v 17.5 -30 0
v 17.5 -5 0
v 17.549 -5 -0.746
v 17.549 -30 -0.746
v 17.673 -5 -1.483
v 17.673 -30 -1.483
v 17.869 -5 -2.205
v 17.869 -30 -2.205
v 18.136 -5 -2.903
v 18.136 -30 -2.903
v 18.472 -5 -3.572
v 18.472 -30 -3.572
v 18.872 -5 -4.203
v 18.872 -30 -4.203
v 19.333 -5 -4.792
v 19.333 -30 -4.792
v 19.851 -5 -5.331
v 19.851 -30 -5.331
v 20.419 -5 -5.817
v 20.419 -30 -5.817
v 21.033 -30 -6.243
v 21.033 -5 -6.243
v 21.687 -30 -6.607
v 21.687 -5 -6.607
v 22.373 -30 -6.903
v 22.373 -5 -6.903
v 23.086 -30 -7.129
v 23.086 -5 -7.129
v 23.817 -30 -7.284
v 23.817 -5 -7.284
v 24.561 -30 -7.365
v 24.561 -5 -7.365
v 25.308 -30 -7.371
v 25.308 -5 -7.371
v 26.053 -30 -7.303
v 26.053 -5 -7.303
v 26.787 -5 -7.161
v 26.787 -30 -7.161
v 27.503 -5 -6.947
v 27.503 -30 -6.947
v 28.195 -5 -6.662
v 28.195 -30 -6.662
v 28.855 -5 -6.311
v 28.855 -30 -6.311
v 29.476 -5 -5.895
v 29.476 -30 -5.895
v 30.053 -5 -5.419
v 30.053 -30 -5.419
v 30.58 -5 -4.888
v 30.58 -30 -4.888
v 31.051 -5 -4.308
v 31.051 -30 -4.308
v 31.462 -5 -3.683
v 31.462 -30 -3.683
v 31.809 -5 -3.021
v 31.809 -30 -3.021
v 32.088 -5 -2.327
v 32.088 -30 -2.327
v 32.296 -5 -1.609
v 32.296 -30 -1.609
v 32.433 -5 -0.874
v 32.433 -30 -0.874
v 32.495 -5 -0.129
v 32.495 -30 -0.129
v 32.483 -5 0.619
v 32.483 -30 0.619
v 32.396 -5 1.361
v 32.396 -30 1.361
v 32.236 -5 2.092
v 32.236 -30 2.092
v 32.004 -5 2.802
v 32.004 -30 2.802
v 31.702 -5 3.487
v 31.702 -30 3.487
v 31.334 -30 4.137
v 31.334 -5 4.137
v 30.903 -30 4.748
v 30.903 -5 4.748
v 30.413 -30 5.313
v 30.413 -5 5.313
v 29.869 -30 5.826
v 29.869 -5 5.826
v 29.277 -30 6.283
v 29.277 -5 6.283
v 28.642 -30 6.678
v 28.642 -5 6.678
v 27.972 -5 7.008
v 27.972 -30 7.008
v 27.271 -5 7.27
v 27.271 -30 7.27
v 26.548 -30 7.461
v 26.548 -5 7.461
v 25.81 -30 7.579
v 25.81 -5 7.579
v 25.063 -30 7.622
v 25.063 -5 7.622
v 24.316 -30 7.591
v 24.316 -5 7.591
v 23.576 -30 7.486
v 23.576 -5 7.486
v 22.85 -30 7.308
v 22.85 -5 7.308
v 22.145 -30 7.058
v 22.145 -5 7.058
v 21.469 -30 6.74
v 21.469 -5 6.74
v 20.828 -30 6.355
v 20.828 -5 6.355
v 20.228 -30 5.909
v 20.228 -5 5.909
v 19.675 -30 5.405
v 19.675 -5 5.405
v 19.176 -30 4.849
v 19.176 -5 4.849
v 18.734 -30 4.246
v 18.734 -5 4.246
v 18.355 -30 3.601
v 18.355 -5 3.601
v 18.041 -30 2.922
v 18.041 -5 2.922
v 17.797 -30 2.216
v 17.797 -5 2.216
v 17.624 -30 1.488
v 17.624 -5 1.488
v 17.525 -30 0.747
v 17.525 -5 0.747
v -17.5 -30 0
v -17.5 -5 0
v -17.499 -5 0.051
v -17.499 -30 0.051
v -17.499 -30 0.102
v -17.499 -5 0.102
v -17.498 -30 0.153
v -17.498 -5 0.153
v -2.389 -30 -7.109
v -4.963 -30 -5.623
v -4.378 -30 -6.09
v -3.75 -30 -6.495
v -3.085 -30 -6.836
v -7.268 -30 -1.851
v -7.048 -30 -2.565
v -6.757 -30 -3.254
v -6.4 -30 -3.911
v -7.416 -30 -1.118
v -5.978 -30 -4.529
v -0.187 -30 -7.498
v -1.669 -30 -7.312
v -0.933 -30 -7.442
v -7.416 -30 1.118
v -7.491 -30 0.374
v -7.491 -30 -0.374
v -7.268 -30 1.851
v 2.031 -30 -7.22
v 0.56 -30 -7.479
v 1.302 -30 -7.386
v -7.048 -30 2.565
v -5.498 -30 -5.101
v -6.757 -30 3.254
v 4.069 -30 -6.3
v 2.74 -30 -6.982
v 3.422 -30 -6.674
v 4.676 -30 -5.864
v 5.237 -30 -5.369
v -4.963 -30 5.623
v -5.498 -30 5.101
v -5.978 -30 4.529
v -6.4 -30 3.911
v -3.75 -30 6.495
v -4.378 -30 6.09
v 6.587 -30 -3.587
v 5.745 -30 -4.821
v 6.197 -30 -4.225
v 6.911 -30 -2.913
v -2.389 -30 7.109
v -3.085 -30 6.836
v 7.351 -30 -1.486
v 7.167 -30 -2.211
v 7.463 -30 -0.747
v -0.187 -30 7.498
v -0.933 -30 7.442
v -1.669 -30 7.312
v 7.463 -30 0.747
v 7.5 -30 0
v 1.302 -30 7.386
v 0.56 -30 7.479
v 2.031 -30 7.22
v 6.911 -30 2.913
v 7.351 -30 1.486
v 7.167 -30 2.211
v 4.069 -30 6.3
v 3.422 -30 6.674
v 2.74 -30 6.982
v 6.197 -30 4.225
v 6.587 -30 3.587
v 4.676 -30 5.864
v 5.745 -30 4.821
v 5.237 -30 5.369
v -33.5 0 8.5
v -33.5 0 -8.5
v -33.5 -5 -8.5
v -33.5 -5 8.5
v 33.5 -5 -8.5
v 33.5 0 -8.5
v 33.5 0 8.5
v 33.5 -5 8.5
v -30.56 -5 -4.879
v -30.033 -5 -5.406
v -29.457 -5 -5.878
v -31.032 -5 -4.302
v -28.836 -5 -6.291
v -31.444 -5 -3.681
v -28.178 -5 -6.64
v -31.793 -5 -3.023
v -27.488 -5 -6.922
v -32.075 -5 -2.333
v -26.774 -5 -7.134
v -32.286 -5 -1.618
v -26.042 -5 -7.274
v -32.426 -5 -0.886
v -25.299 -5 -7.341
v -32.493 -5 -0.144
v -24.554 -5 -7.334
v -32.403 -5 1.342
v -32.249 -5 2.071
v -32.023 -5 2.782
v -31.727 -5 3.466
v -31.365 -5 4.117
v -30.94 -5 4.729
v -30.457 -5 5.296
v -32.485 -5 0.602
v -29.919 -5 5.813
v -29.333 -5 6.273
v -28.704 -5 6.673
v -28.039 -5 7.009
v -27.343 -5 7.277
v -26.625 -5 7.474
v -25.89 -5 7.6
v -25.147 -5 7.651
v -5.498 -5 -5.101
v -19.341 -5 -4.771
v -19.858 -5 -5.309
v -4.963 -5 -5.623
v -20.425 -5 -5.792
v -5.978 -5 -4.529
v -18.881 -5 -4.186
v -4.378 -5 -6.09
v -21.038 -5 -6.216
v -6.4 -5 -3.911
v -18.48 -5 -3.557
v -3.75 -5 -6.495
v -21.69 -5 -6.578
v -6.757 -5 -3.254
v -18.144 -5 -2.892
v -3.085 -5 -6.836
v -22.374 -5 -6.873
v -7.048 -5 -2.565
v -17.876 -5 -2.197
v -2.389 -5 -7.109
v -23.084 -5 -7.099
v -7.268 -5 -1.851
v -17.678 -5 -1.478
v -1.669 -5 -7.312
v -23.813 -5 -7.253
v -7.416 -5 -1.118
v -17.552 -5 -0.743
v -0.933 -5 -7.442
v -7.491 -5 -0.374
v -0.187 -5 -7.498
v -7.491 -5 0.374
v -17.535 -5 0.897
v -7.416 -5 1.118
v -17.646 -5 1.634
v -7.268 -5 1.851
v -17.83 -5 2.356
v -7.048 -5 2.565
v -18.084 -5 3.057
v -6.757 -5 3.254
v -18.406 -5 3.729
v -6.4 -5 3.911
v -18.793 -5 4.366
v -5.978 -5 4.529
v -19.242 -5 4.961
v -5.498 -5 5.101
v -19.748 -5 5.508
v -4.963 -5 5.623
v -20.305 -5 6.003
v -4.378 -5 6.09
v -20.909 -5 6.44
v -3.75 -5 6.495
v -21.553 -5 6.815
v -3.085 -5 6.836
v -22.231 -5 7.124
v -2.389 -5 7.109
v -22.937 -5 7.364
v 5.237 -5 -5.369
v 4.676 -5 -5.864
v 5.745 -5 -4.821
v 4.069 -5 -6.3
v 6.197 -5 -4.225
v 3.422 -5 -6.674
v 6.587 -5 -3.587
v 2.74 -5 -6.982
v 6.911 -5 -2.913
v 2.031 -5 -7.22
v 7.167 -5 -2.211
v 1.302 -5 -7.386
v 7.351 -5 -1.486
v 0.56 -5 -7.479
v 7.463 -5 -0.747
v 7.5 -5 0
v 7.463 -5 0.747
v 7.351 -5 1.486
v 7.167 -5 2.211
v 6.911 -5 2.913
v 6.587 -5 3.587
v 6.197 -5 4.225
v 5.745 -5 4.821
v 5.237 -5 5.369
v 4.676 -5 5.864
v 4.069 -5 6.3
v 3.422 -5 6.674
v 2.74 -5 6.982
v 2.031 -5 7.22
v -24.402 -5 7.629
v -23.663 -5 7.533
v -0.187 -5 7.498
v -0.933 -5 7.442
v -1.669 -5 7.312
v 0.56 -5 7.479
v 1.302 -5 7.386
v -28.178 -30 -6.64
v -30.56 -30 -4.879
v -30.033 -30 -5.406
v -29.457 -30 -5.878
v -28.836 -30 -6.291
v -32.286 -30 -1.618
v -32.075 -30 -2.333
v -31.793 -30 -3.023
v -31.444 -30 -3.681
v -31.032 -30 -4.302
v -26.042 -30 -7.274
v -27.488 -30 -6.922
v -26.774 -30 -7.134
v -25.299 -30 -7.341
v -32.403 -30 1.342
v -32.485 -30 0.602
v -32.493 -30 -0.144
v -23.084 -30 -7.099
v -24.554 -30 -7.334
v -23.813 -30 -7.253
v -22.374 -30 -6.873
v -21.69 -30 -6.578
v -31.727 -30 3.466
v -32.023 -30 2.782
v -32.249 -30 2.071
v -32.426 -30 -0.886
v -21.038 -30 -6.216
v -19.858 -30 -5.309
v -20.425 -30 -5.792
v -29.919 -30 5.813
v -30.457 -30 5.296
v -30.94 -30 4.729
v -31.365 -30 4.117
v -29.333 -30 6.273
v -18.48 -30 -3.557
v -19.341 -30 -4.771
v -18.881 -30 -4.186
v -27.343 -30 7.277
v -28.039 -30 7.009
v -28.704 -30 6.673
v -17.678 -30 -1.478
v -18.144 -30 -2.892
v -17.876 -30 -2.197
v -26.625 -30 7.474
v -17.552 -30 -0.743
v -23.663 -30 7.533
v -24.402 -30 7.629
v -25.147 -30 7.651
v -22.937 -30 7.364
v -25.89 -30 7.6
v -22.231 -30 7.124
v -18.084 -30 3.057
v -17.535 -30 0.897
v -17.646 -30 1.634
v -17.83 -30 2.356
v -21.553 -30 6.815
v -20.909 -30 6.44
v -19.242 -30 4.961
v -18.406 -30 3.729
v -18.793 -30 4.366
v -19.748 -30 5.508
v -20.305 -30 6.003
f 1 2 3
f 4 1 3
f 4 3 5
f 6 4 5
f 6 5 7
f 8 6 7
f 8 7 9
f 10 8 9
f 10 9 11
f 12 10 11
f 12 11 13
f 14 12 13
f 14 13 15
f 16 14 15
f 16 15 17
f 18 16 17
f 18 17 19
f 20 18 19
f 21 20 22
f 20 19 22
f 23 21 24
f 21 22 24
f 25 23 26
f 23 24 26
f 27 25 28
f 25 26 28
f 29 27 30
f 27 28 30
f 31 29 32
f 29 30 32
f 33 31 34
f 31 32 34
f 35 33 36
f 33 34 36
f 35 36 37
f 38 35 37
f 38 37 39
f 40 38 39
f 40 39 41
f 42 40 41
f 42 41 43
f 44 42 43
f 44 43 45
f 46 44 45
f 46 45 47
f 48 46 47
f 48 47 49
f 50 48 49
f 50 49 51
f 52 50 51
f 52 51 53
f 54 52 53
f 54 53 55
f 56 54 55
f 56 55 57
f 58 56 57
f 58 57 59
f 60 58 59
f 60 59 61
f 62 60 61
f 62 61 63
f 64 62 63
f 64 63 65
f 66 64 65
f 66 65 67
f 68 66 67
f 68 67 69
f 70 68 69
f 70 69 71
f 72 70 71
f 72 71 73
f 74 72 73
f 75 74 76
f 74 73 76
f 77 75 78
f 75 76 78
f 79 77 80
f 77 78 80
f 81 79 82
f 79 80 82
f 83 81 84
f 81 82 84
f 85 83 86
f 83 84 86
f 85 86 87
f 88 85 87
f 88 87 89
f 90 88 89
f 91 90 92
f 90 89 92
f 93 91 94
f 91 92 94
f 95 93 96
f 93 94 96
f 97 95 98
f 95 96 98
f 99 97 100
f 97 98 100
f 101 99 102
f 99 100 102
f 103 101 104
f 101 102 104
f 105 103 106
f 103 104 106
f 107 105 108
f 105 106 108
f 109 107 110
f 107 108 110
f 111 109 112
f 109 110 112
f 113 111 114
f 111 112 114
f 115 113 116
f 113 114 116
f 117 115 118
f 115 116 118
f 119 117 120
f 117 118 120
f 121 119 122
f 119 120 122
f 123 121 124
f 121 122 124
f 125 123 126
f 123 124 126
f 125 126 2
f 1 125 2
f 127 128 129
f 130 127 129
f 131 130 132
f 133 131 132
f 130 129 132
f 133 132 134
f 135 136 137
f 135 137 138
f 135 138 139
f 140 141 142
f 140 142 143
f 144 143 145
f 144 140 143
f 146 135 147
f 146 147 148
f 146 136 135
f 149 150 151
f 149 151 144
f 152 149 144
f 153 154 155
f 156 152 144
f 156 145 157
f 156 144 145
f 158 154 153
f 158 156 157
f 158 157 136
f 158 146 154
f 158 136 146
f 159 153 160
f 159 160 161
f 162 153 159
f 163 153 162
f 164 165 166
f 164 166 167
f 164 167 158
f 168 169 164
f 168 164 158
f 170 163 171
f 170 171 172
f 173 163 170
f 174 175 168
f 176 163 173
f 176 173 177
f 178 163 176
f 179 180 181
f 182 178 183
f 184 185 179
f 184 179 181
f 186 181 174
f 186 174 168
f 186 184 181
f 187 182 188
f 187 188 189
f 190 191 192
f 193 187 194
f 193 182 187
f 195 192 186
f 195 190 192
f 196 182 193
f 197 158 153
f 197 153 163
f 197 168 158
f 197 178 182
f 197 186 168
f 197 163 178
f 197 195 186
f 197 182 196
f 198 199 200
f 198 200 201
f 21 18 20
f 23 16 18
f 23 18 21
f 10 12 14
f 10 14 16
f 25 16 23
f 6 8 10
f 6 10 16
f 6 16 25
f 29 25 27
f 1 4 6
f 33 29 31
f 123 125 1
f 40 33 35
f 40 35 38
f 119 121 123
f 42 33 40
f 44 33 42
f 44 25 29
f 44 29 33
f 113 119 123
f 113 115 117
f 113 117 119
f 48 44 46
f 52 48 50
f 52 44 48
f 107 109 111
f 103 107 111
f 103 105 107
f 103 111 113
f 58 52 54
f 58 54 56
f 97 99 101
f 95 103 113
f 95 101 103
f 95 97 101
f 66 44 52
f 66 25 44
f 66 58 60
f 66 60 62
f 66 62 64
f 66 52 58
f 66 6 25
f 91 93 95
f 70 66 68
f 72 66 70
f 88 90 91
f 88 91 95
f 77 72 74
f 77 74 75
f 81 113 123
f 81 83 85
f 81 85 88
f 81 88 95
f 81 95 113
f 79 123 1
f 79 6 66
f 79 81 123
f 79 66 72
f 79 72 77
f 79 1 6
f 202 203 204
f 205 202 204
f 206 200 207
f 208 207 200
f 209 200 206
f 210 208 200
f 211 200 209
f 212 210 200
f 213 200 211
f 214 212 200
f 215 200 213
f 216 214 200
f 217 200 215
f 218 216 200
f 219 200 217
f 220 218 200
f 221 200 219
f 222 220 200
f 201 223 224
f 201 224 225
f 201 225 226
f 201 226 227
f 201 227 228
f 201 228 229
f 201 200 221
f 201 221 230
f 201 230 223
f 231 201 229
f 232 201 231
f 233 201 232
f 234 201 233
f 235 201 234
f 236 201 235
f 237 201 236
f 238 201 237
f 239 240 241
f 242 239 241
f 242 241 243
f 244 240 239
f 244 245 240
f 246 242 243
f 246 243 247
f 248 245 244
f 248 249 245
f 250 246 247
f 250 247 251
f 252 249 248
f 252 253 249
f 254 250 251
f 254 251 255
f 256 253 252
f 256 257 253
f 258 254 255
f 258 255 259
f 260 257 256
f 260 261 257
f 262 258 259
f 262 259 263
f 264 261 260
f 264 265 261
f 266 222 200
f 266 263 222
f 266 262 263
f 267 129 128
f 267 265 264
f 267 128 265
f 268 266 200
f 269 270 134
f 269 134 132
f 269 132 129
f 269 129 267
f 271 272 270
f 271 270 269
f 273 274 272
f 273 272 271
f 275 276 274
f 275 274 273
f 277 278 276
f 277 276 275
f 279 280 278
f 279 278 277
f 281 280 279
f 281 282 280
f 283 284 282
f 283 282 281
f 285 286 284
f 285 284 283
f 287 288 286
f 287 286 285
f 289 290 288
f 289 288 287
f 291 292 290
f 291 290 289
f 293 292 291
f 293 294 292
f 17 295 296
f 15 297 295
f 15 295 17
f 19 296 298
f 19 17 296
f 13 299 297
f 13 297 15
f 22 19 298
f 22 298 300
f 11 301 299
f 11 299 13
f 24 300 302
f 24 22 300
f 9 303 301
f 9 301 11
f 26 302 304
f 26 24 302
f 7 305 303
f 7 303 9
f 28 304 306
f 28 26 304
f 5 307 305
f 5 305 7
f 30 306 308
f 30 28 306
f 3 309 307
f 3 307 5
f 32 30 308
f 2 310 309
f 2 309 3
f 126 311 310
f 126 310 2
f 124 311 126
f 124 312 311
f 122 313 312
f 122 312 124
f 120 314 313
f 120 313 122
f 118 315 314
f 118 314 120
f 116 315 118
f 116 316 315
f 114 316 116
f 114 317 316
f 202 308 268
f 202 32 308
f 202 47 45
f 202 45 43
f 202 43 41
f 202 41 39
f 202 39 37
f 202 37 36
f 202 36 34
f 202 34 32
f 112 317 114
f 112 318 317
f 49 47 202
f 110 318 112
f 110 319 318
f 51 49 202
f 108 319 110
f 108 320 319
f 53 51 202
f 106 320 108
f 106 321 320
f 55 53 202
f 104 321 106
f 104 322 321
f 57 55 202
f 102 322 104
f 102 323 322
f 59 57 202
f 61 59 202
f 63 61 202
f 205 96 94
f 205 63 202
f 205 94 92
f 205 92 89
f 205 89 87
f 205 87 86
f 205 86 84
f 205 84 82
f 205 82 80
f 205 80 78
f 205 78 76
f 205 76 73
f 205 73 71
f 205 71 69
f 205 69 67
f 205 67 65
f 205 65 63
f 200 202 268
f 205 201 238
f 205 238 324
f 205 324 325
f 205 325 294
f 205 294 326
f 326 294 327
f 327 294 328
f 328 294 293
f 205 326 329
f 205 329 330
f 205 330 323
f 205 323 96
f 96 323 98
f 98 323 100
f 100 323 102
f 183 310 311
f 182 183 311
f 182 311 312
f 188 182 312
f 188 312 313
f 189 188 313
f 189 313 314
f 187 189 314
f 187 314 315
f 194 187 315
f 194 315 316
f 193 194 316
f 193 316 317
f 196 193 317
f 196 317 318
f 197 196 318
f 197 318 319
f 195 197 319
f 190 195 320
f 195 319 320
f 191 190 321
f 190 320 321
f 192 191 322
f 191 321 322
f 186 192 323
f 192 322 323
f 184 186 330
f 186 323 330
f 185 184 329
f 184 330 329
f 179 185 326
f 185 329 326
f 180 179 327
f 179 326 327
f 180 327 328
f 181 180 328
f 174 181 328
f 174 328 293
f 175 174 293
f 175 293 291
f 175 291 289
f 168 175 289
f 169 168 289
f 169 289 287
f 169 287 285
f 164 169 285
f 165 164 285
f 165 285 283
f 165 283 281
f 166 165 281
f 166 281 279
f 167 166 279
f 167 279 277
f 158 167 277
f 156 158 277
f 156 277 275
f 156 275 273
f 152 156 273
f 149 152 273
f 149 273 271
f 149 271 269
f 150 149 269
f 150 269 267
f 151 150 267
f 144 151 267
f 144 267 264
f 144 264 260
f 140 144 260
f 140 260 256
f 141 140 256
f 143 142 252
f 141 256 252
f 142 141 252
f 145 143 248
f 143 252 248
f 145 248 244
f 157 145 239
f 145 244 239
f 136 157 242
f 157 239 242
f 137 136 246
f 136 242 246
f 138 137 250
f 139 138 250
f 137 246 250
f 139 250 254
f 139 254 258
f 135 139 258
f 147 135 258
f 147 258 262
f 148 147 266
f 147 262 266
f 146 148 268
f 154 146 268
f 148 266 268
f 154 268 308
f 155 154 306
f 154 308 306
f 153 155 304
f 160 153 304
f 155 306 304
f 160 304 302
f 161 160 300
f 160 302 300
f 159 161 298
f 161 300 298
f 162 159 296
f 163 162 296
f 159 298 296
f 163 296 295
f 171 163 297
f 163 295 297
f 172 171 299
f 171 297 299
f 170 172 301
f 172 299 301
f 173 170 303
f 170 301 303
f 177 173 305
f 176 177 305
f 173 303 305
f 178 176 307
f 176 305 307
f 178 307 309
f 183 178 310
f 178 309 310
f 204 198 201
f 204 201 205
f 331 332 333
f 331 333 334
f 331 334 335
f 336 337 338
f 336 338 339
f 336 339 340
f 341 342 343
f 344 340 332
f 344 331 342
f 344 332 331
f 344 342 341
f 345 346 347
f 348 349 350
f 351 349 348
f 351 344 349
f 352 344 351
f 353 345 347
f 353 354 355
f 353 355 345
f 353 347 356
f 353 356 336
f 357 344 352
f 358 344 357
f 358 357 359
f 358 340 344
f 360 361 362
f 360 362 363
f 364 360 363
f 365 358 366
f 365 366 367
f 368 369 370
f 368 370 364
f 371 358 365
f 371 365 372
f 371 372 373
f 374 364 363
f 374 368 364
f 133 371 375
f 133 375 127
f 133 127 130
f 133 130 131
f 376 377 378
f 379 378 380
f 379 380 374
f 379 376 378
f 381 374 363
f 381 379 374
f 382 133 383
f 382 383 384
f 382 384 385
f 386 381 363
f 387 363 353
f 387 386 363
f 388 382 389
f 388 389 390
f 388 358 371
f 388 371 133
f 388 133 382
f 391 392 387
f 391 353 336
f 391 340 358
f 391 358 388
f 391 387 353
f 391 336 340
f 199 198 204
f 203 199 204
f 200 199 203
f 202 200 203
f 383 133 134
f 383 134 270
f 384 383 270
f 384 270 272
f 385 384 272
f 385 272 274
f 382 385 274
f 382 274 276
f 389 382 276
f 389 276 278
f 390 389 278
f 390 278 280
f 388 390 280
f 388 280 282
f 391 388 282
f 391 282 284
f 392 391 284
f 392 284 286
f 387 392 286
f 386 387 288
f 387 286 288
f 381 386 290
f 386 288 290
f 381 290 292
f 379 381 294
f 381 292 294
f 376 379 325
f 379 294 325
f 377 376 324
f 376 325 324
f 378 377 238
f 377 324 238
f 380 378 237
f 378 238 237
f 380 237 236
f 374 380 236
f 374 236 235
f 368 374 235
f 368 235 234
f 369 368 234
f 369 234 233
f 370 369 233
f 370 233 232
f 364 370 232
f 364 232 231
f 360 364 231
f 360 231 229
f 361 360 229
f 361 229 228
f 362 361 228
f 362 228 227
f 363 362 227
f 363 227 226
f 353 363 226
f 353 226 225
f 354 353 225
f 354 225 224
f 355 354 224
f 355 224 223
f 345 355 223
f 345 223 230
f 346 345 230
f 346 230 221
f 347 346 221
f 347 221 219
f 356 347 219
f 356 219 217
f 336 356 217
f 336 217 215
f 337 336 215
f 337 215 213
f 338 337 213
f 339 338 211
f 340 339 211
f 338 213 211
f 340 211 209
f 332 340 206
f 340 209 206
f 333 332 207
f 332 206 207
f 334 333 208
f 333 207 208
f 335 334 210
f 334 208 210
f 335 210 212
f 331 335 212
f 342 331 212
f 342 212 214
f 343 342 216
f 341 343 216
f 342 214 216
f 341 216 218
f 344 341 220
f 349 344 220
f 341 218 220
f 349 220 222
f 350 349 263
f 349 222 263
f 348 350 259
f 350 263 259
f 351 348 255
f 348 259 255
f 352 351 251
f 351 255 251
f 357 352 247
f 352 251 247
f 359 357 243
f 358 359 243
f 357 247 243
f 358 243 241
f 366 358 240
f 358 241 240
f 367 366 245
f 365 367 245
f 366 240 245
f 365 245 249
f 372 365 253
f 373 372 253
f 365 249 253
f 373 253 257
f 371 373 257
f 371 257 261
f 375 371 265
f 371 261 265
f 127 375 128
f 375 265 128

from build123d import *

# Parameters (mm, degrees)
F0_W     = 67
F0_H     = 17
F1_DEPTH = 5
F2_DEPTH = 30
F3_DEPTH = 30


with BuildPart() as f1:
    # F0 (on Front) → F1 (new body)
    with BuildSketch(Plane.XZ):
        Rectangle(F0_W, F0_H)
        with BuildLine():
            ThreePointArc((-17.498445447, 0.1526953798), (-17.4988340953, 0.0763437334), (-17.5, 0))
            ThreePointArc((-17.5, 0), (-32.4980567986, 0.2290470263), (-17.498445447, 0.1526953798))
        make_face(mode=Mode.SUBTRACT)
        with BuildLine():
            ThreePointArc((-7.5, 0), (0, 7.5), (7.5, 0))
            ThreePointArc((7.5, 0), (0, -7.5), (-7.5, 0))
        make_face(mode=Mode.SUBTRACT)
        with BuildLine():
            ThreePointArc((32.4989989183, 0.1225366207), (25.0602692732, -7.3772131047), (17.5, 0))
            ThreePointArc((17.5, 0), (24.9377285633, 7.6222863461), (32.4989989183, 0.1225366207))
        make_face(mode=Mode.SUBTRACT)
    extrude(amount=F1_DEPTH)

    # F0 (on Front) → F2 (join)
    with BuildSketch(Plane.XZ):
        with BuildLine():
            ThreePointArc((-17.498445447, 0.1526953798), (-32.4980567986, 0.2290470263), (-17.5, 0))
            ThreePointArc((-17.5, 0), (-17.4988340953, 0.0763437334), (-17.498445447, 0.1526953798))
        make_face()
    extrude(amount=F2_DEPTH)

    # F0 (on Front) → F3 (join)
    with BuildSketch(Plane.XZ):
        with BuildLine():
            ThreePointArc((-7.5, 0), (0, -7.5), (7.5, 0))
            ThreePointArc((7.5, 0), (0, 7.5), (-7.5, 0))
        make_face()
        with BuildLine():
            ThreePointArc((32.4989989183, 0.1225366207), (24.9377285633, 7.6222863461), (17.5, 0))
            ThreePointArc((17.5, 0), (25.0602692732, -7.3772131047), (32.4989989183, 0.1225366207))
        make_face()
    extrude(amount=F3_DEPTH)


solid = f1.part
